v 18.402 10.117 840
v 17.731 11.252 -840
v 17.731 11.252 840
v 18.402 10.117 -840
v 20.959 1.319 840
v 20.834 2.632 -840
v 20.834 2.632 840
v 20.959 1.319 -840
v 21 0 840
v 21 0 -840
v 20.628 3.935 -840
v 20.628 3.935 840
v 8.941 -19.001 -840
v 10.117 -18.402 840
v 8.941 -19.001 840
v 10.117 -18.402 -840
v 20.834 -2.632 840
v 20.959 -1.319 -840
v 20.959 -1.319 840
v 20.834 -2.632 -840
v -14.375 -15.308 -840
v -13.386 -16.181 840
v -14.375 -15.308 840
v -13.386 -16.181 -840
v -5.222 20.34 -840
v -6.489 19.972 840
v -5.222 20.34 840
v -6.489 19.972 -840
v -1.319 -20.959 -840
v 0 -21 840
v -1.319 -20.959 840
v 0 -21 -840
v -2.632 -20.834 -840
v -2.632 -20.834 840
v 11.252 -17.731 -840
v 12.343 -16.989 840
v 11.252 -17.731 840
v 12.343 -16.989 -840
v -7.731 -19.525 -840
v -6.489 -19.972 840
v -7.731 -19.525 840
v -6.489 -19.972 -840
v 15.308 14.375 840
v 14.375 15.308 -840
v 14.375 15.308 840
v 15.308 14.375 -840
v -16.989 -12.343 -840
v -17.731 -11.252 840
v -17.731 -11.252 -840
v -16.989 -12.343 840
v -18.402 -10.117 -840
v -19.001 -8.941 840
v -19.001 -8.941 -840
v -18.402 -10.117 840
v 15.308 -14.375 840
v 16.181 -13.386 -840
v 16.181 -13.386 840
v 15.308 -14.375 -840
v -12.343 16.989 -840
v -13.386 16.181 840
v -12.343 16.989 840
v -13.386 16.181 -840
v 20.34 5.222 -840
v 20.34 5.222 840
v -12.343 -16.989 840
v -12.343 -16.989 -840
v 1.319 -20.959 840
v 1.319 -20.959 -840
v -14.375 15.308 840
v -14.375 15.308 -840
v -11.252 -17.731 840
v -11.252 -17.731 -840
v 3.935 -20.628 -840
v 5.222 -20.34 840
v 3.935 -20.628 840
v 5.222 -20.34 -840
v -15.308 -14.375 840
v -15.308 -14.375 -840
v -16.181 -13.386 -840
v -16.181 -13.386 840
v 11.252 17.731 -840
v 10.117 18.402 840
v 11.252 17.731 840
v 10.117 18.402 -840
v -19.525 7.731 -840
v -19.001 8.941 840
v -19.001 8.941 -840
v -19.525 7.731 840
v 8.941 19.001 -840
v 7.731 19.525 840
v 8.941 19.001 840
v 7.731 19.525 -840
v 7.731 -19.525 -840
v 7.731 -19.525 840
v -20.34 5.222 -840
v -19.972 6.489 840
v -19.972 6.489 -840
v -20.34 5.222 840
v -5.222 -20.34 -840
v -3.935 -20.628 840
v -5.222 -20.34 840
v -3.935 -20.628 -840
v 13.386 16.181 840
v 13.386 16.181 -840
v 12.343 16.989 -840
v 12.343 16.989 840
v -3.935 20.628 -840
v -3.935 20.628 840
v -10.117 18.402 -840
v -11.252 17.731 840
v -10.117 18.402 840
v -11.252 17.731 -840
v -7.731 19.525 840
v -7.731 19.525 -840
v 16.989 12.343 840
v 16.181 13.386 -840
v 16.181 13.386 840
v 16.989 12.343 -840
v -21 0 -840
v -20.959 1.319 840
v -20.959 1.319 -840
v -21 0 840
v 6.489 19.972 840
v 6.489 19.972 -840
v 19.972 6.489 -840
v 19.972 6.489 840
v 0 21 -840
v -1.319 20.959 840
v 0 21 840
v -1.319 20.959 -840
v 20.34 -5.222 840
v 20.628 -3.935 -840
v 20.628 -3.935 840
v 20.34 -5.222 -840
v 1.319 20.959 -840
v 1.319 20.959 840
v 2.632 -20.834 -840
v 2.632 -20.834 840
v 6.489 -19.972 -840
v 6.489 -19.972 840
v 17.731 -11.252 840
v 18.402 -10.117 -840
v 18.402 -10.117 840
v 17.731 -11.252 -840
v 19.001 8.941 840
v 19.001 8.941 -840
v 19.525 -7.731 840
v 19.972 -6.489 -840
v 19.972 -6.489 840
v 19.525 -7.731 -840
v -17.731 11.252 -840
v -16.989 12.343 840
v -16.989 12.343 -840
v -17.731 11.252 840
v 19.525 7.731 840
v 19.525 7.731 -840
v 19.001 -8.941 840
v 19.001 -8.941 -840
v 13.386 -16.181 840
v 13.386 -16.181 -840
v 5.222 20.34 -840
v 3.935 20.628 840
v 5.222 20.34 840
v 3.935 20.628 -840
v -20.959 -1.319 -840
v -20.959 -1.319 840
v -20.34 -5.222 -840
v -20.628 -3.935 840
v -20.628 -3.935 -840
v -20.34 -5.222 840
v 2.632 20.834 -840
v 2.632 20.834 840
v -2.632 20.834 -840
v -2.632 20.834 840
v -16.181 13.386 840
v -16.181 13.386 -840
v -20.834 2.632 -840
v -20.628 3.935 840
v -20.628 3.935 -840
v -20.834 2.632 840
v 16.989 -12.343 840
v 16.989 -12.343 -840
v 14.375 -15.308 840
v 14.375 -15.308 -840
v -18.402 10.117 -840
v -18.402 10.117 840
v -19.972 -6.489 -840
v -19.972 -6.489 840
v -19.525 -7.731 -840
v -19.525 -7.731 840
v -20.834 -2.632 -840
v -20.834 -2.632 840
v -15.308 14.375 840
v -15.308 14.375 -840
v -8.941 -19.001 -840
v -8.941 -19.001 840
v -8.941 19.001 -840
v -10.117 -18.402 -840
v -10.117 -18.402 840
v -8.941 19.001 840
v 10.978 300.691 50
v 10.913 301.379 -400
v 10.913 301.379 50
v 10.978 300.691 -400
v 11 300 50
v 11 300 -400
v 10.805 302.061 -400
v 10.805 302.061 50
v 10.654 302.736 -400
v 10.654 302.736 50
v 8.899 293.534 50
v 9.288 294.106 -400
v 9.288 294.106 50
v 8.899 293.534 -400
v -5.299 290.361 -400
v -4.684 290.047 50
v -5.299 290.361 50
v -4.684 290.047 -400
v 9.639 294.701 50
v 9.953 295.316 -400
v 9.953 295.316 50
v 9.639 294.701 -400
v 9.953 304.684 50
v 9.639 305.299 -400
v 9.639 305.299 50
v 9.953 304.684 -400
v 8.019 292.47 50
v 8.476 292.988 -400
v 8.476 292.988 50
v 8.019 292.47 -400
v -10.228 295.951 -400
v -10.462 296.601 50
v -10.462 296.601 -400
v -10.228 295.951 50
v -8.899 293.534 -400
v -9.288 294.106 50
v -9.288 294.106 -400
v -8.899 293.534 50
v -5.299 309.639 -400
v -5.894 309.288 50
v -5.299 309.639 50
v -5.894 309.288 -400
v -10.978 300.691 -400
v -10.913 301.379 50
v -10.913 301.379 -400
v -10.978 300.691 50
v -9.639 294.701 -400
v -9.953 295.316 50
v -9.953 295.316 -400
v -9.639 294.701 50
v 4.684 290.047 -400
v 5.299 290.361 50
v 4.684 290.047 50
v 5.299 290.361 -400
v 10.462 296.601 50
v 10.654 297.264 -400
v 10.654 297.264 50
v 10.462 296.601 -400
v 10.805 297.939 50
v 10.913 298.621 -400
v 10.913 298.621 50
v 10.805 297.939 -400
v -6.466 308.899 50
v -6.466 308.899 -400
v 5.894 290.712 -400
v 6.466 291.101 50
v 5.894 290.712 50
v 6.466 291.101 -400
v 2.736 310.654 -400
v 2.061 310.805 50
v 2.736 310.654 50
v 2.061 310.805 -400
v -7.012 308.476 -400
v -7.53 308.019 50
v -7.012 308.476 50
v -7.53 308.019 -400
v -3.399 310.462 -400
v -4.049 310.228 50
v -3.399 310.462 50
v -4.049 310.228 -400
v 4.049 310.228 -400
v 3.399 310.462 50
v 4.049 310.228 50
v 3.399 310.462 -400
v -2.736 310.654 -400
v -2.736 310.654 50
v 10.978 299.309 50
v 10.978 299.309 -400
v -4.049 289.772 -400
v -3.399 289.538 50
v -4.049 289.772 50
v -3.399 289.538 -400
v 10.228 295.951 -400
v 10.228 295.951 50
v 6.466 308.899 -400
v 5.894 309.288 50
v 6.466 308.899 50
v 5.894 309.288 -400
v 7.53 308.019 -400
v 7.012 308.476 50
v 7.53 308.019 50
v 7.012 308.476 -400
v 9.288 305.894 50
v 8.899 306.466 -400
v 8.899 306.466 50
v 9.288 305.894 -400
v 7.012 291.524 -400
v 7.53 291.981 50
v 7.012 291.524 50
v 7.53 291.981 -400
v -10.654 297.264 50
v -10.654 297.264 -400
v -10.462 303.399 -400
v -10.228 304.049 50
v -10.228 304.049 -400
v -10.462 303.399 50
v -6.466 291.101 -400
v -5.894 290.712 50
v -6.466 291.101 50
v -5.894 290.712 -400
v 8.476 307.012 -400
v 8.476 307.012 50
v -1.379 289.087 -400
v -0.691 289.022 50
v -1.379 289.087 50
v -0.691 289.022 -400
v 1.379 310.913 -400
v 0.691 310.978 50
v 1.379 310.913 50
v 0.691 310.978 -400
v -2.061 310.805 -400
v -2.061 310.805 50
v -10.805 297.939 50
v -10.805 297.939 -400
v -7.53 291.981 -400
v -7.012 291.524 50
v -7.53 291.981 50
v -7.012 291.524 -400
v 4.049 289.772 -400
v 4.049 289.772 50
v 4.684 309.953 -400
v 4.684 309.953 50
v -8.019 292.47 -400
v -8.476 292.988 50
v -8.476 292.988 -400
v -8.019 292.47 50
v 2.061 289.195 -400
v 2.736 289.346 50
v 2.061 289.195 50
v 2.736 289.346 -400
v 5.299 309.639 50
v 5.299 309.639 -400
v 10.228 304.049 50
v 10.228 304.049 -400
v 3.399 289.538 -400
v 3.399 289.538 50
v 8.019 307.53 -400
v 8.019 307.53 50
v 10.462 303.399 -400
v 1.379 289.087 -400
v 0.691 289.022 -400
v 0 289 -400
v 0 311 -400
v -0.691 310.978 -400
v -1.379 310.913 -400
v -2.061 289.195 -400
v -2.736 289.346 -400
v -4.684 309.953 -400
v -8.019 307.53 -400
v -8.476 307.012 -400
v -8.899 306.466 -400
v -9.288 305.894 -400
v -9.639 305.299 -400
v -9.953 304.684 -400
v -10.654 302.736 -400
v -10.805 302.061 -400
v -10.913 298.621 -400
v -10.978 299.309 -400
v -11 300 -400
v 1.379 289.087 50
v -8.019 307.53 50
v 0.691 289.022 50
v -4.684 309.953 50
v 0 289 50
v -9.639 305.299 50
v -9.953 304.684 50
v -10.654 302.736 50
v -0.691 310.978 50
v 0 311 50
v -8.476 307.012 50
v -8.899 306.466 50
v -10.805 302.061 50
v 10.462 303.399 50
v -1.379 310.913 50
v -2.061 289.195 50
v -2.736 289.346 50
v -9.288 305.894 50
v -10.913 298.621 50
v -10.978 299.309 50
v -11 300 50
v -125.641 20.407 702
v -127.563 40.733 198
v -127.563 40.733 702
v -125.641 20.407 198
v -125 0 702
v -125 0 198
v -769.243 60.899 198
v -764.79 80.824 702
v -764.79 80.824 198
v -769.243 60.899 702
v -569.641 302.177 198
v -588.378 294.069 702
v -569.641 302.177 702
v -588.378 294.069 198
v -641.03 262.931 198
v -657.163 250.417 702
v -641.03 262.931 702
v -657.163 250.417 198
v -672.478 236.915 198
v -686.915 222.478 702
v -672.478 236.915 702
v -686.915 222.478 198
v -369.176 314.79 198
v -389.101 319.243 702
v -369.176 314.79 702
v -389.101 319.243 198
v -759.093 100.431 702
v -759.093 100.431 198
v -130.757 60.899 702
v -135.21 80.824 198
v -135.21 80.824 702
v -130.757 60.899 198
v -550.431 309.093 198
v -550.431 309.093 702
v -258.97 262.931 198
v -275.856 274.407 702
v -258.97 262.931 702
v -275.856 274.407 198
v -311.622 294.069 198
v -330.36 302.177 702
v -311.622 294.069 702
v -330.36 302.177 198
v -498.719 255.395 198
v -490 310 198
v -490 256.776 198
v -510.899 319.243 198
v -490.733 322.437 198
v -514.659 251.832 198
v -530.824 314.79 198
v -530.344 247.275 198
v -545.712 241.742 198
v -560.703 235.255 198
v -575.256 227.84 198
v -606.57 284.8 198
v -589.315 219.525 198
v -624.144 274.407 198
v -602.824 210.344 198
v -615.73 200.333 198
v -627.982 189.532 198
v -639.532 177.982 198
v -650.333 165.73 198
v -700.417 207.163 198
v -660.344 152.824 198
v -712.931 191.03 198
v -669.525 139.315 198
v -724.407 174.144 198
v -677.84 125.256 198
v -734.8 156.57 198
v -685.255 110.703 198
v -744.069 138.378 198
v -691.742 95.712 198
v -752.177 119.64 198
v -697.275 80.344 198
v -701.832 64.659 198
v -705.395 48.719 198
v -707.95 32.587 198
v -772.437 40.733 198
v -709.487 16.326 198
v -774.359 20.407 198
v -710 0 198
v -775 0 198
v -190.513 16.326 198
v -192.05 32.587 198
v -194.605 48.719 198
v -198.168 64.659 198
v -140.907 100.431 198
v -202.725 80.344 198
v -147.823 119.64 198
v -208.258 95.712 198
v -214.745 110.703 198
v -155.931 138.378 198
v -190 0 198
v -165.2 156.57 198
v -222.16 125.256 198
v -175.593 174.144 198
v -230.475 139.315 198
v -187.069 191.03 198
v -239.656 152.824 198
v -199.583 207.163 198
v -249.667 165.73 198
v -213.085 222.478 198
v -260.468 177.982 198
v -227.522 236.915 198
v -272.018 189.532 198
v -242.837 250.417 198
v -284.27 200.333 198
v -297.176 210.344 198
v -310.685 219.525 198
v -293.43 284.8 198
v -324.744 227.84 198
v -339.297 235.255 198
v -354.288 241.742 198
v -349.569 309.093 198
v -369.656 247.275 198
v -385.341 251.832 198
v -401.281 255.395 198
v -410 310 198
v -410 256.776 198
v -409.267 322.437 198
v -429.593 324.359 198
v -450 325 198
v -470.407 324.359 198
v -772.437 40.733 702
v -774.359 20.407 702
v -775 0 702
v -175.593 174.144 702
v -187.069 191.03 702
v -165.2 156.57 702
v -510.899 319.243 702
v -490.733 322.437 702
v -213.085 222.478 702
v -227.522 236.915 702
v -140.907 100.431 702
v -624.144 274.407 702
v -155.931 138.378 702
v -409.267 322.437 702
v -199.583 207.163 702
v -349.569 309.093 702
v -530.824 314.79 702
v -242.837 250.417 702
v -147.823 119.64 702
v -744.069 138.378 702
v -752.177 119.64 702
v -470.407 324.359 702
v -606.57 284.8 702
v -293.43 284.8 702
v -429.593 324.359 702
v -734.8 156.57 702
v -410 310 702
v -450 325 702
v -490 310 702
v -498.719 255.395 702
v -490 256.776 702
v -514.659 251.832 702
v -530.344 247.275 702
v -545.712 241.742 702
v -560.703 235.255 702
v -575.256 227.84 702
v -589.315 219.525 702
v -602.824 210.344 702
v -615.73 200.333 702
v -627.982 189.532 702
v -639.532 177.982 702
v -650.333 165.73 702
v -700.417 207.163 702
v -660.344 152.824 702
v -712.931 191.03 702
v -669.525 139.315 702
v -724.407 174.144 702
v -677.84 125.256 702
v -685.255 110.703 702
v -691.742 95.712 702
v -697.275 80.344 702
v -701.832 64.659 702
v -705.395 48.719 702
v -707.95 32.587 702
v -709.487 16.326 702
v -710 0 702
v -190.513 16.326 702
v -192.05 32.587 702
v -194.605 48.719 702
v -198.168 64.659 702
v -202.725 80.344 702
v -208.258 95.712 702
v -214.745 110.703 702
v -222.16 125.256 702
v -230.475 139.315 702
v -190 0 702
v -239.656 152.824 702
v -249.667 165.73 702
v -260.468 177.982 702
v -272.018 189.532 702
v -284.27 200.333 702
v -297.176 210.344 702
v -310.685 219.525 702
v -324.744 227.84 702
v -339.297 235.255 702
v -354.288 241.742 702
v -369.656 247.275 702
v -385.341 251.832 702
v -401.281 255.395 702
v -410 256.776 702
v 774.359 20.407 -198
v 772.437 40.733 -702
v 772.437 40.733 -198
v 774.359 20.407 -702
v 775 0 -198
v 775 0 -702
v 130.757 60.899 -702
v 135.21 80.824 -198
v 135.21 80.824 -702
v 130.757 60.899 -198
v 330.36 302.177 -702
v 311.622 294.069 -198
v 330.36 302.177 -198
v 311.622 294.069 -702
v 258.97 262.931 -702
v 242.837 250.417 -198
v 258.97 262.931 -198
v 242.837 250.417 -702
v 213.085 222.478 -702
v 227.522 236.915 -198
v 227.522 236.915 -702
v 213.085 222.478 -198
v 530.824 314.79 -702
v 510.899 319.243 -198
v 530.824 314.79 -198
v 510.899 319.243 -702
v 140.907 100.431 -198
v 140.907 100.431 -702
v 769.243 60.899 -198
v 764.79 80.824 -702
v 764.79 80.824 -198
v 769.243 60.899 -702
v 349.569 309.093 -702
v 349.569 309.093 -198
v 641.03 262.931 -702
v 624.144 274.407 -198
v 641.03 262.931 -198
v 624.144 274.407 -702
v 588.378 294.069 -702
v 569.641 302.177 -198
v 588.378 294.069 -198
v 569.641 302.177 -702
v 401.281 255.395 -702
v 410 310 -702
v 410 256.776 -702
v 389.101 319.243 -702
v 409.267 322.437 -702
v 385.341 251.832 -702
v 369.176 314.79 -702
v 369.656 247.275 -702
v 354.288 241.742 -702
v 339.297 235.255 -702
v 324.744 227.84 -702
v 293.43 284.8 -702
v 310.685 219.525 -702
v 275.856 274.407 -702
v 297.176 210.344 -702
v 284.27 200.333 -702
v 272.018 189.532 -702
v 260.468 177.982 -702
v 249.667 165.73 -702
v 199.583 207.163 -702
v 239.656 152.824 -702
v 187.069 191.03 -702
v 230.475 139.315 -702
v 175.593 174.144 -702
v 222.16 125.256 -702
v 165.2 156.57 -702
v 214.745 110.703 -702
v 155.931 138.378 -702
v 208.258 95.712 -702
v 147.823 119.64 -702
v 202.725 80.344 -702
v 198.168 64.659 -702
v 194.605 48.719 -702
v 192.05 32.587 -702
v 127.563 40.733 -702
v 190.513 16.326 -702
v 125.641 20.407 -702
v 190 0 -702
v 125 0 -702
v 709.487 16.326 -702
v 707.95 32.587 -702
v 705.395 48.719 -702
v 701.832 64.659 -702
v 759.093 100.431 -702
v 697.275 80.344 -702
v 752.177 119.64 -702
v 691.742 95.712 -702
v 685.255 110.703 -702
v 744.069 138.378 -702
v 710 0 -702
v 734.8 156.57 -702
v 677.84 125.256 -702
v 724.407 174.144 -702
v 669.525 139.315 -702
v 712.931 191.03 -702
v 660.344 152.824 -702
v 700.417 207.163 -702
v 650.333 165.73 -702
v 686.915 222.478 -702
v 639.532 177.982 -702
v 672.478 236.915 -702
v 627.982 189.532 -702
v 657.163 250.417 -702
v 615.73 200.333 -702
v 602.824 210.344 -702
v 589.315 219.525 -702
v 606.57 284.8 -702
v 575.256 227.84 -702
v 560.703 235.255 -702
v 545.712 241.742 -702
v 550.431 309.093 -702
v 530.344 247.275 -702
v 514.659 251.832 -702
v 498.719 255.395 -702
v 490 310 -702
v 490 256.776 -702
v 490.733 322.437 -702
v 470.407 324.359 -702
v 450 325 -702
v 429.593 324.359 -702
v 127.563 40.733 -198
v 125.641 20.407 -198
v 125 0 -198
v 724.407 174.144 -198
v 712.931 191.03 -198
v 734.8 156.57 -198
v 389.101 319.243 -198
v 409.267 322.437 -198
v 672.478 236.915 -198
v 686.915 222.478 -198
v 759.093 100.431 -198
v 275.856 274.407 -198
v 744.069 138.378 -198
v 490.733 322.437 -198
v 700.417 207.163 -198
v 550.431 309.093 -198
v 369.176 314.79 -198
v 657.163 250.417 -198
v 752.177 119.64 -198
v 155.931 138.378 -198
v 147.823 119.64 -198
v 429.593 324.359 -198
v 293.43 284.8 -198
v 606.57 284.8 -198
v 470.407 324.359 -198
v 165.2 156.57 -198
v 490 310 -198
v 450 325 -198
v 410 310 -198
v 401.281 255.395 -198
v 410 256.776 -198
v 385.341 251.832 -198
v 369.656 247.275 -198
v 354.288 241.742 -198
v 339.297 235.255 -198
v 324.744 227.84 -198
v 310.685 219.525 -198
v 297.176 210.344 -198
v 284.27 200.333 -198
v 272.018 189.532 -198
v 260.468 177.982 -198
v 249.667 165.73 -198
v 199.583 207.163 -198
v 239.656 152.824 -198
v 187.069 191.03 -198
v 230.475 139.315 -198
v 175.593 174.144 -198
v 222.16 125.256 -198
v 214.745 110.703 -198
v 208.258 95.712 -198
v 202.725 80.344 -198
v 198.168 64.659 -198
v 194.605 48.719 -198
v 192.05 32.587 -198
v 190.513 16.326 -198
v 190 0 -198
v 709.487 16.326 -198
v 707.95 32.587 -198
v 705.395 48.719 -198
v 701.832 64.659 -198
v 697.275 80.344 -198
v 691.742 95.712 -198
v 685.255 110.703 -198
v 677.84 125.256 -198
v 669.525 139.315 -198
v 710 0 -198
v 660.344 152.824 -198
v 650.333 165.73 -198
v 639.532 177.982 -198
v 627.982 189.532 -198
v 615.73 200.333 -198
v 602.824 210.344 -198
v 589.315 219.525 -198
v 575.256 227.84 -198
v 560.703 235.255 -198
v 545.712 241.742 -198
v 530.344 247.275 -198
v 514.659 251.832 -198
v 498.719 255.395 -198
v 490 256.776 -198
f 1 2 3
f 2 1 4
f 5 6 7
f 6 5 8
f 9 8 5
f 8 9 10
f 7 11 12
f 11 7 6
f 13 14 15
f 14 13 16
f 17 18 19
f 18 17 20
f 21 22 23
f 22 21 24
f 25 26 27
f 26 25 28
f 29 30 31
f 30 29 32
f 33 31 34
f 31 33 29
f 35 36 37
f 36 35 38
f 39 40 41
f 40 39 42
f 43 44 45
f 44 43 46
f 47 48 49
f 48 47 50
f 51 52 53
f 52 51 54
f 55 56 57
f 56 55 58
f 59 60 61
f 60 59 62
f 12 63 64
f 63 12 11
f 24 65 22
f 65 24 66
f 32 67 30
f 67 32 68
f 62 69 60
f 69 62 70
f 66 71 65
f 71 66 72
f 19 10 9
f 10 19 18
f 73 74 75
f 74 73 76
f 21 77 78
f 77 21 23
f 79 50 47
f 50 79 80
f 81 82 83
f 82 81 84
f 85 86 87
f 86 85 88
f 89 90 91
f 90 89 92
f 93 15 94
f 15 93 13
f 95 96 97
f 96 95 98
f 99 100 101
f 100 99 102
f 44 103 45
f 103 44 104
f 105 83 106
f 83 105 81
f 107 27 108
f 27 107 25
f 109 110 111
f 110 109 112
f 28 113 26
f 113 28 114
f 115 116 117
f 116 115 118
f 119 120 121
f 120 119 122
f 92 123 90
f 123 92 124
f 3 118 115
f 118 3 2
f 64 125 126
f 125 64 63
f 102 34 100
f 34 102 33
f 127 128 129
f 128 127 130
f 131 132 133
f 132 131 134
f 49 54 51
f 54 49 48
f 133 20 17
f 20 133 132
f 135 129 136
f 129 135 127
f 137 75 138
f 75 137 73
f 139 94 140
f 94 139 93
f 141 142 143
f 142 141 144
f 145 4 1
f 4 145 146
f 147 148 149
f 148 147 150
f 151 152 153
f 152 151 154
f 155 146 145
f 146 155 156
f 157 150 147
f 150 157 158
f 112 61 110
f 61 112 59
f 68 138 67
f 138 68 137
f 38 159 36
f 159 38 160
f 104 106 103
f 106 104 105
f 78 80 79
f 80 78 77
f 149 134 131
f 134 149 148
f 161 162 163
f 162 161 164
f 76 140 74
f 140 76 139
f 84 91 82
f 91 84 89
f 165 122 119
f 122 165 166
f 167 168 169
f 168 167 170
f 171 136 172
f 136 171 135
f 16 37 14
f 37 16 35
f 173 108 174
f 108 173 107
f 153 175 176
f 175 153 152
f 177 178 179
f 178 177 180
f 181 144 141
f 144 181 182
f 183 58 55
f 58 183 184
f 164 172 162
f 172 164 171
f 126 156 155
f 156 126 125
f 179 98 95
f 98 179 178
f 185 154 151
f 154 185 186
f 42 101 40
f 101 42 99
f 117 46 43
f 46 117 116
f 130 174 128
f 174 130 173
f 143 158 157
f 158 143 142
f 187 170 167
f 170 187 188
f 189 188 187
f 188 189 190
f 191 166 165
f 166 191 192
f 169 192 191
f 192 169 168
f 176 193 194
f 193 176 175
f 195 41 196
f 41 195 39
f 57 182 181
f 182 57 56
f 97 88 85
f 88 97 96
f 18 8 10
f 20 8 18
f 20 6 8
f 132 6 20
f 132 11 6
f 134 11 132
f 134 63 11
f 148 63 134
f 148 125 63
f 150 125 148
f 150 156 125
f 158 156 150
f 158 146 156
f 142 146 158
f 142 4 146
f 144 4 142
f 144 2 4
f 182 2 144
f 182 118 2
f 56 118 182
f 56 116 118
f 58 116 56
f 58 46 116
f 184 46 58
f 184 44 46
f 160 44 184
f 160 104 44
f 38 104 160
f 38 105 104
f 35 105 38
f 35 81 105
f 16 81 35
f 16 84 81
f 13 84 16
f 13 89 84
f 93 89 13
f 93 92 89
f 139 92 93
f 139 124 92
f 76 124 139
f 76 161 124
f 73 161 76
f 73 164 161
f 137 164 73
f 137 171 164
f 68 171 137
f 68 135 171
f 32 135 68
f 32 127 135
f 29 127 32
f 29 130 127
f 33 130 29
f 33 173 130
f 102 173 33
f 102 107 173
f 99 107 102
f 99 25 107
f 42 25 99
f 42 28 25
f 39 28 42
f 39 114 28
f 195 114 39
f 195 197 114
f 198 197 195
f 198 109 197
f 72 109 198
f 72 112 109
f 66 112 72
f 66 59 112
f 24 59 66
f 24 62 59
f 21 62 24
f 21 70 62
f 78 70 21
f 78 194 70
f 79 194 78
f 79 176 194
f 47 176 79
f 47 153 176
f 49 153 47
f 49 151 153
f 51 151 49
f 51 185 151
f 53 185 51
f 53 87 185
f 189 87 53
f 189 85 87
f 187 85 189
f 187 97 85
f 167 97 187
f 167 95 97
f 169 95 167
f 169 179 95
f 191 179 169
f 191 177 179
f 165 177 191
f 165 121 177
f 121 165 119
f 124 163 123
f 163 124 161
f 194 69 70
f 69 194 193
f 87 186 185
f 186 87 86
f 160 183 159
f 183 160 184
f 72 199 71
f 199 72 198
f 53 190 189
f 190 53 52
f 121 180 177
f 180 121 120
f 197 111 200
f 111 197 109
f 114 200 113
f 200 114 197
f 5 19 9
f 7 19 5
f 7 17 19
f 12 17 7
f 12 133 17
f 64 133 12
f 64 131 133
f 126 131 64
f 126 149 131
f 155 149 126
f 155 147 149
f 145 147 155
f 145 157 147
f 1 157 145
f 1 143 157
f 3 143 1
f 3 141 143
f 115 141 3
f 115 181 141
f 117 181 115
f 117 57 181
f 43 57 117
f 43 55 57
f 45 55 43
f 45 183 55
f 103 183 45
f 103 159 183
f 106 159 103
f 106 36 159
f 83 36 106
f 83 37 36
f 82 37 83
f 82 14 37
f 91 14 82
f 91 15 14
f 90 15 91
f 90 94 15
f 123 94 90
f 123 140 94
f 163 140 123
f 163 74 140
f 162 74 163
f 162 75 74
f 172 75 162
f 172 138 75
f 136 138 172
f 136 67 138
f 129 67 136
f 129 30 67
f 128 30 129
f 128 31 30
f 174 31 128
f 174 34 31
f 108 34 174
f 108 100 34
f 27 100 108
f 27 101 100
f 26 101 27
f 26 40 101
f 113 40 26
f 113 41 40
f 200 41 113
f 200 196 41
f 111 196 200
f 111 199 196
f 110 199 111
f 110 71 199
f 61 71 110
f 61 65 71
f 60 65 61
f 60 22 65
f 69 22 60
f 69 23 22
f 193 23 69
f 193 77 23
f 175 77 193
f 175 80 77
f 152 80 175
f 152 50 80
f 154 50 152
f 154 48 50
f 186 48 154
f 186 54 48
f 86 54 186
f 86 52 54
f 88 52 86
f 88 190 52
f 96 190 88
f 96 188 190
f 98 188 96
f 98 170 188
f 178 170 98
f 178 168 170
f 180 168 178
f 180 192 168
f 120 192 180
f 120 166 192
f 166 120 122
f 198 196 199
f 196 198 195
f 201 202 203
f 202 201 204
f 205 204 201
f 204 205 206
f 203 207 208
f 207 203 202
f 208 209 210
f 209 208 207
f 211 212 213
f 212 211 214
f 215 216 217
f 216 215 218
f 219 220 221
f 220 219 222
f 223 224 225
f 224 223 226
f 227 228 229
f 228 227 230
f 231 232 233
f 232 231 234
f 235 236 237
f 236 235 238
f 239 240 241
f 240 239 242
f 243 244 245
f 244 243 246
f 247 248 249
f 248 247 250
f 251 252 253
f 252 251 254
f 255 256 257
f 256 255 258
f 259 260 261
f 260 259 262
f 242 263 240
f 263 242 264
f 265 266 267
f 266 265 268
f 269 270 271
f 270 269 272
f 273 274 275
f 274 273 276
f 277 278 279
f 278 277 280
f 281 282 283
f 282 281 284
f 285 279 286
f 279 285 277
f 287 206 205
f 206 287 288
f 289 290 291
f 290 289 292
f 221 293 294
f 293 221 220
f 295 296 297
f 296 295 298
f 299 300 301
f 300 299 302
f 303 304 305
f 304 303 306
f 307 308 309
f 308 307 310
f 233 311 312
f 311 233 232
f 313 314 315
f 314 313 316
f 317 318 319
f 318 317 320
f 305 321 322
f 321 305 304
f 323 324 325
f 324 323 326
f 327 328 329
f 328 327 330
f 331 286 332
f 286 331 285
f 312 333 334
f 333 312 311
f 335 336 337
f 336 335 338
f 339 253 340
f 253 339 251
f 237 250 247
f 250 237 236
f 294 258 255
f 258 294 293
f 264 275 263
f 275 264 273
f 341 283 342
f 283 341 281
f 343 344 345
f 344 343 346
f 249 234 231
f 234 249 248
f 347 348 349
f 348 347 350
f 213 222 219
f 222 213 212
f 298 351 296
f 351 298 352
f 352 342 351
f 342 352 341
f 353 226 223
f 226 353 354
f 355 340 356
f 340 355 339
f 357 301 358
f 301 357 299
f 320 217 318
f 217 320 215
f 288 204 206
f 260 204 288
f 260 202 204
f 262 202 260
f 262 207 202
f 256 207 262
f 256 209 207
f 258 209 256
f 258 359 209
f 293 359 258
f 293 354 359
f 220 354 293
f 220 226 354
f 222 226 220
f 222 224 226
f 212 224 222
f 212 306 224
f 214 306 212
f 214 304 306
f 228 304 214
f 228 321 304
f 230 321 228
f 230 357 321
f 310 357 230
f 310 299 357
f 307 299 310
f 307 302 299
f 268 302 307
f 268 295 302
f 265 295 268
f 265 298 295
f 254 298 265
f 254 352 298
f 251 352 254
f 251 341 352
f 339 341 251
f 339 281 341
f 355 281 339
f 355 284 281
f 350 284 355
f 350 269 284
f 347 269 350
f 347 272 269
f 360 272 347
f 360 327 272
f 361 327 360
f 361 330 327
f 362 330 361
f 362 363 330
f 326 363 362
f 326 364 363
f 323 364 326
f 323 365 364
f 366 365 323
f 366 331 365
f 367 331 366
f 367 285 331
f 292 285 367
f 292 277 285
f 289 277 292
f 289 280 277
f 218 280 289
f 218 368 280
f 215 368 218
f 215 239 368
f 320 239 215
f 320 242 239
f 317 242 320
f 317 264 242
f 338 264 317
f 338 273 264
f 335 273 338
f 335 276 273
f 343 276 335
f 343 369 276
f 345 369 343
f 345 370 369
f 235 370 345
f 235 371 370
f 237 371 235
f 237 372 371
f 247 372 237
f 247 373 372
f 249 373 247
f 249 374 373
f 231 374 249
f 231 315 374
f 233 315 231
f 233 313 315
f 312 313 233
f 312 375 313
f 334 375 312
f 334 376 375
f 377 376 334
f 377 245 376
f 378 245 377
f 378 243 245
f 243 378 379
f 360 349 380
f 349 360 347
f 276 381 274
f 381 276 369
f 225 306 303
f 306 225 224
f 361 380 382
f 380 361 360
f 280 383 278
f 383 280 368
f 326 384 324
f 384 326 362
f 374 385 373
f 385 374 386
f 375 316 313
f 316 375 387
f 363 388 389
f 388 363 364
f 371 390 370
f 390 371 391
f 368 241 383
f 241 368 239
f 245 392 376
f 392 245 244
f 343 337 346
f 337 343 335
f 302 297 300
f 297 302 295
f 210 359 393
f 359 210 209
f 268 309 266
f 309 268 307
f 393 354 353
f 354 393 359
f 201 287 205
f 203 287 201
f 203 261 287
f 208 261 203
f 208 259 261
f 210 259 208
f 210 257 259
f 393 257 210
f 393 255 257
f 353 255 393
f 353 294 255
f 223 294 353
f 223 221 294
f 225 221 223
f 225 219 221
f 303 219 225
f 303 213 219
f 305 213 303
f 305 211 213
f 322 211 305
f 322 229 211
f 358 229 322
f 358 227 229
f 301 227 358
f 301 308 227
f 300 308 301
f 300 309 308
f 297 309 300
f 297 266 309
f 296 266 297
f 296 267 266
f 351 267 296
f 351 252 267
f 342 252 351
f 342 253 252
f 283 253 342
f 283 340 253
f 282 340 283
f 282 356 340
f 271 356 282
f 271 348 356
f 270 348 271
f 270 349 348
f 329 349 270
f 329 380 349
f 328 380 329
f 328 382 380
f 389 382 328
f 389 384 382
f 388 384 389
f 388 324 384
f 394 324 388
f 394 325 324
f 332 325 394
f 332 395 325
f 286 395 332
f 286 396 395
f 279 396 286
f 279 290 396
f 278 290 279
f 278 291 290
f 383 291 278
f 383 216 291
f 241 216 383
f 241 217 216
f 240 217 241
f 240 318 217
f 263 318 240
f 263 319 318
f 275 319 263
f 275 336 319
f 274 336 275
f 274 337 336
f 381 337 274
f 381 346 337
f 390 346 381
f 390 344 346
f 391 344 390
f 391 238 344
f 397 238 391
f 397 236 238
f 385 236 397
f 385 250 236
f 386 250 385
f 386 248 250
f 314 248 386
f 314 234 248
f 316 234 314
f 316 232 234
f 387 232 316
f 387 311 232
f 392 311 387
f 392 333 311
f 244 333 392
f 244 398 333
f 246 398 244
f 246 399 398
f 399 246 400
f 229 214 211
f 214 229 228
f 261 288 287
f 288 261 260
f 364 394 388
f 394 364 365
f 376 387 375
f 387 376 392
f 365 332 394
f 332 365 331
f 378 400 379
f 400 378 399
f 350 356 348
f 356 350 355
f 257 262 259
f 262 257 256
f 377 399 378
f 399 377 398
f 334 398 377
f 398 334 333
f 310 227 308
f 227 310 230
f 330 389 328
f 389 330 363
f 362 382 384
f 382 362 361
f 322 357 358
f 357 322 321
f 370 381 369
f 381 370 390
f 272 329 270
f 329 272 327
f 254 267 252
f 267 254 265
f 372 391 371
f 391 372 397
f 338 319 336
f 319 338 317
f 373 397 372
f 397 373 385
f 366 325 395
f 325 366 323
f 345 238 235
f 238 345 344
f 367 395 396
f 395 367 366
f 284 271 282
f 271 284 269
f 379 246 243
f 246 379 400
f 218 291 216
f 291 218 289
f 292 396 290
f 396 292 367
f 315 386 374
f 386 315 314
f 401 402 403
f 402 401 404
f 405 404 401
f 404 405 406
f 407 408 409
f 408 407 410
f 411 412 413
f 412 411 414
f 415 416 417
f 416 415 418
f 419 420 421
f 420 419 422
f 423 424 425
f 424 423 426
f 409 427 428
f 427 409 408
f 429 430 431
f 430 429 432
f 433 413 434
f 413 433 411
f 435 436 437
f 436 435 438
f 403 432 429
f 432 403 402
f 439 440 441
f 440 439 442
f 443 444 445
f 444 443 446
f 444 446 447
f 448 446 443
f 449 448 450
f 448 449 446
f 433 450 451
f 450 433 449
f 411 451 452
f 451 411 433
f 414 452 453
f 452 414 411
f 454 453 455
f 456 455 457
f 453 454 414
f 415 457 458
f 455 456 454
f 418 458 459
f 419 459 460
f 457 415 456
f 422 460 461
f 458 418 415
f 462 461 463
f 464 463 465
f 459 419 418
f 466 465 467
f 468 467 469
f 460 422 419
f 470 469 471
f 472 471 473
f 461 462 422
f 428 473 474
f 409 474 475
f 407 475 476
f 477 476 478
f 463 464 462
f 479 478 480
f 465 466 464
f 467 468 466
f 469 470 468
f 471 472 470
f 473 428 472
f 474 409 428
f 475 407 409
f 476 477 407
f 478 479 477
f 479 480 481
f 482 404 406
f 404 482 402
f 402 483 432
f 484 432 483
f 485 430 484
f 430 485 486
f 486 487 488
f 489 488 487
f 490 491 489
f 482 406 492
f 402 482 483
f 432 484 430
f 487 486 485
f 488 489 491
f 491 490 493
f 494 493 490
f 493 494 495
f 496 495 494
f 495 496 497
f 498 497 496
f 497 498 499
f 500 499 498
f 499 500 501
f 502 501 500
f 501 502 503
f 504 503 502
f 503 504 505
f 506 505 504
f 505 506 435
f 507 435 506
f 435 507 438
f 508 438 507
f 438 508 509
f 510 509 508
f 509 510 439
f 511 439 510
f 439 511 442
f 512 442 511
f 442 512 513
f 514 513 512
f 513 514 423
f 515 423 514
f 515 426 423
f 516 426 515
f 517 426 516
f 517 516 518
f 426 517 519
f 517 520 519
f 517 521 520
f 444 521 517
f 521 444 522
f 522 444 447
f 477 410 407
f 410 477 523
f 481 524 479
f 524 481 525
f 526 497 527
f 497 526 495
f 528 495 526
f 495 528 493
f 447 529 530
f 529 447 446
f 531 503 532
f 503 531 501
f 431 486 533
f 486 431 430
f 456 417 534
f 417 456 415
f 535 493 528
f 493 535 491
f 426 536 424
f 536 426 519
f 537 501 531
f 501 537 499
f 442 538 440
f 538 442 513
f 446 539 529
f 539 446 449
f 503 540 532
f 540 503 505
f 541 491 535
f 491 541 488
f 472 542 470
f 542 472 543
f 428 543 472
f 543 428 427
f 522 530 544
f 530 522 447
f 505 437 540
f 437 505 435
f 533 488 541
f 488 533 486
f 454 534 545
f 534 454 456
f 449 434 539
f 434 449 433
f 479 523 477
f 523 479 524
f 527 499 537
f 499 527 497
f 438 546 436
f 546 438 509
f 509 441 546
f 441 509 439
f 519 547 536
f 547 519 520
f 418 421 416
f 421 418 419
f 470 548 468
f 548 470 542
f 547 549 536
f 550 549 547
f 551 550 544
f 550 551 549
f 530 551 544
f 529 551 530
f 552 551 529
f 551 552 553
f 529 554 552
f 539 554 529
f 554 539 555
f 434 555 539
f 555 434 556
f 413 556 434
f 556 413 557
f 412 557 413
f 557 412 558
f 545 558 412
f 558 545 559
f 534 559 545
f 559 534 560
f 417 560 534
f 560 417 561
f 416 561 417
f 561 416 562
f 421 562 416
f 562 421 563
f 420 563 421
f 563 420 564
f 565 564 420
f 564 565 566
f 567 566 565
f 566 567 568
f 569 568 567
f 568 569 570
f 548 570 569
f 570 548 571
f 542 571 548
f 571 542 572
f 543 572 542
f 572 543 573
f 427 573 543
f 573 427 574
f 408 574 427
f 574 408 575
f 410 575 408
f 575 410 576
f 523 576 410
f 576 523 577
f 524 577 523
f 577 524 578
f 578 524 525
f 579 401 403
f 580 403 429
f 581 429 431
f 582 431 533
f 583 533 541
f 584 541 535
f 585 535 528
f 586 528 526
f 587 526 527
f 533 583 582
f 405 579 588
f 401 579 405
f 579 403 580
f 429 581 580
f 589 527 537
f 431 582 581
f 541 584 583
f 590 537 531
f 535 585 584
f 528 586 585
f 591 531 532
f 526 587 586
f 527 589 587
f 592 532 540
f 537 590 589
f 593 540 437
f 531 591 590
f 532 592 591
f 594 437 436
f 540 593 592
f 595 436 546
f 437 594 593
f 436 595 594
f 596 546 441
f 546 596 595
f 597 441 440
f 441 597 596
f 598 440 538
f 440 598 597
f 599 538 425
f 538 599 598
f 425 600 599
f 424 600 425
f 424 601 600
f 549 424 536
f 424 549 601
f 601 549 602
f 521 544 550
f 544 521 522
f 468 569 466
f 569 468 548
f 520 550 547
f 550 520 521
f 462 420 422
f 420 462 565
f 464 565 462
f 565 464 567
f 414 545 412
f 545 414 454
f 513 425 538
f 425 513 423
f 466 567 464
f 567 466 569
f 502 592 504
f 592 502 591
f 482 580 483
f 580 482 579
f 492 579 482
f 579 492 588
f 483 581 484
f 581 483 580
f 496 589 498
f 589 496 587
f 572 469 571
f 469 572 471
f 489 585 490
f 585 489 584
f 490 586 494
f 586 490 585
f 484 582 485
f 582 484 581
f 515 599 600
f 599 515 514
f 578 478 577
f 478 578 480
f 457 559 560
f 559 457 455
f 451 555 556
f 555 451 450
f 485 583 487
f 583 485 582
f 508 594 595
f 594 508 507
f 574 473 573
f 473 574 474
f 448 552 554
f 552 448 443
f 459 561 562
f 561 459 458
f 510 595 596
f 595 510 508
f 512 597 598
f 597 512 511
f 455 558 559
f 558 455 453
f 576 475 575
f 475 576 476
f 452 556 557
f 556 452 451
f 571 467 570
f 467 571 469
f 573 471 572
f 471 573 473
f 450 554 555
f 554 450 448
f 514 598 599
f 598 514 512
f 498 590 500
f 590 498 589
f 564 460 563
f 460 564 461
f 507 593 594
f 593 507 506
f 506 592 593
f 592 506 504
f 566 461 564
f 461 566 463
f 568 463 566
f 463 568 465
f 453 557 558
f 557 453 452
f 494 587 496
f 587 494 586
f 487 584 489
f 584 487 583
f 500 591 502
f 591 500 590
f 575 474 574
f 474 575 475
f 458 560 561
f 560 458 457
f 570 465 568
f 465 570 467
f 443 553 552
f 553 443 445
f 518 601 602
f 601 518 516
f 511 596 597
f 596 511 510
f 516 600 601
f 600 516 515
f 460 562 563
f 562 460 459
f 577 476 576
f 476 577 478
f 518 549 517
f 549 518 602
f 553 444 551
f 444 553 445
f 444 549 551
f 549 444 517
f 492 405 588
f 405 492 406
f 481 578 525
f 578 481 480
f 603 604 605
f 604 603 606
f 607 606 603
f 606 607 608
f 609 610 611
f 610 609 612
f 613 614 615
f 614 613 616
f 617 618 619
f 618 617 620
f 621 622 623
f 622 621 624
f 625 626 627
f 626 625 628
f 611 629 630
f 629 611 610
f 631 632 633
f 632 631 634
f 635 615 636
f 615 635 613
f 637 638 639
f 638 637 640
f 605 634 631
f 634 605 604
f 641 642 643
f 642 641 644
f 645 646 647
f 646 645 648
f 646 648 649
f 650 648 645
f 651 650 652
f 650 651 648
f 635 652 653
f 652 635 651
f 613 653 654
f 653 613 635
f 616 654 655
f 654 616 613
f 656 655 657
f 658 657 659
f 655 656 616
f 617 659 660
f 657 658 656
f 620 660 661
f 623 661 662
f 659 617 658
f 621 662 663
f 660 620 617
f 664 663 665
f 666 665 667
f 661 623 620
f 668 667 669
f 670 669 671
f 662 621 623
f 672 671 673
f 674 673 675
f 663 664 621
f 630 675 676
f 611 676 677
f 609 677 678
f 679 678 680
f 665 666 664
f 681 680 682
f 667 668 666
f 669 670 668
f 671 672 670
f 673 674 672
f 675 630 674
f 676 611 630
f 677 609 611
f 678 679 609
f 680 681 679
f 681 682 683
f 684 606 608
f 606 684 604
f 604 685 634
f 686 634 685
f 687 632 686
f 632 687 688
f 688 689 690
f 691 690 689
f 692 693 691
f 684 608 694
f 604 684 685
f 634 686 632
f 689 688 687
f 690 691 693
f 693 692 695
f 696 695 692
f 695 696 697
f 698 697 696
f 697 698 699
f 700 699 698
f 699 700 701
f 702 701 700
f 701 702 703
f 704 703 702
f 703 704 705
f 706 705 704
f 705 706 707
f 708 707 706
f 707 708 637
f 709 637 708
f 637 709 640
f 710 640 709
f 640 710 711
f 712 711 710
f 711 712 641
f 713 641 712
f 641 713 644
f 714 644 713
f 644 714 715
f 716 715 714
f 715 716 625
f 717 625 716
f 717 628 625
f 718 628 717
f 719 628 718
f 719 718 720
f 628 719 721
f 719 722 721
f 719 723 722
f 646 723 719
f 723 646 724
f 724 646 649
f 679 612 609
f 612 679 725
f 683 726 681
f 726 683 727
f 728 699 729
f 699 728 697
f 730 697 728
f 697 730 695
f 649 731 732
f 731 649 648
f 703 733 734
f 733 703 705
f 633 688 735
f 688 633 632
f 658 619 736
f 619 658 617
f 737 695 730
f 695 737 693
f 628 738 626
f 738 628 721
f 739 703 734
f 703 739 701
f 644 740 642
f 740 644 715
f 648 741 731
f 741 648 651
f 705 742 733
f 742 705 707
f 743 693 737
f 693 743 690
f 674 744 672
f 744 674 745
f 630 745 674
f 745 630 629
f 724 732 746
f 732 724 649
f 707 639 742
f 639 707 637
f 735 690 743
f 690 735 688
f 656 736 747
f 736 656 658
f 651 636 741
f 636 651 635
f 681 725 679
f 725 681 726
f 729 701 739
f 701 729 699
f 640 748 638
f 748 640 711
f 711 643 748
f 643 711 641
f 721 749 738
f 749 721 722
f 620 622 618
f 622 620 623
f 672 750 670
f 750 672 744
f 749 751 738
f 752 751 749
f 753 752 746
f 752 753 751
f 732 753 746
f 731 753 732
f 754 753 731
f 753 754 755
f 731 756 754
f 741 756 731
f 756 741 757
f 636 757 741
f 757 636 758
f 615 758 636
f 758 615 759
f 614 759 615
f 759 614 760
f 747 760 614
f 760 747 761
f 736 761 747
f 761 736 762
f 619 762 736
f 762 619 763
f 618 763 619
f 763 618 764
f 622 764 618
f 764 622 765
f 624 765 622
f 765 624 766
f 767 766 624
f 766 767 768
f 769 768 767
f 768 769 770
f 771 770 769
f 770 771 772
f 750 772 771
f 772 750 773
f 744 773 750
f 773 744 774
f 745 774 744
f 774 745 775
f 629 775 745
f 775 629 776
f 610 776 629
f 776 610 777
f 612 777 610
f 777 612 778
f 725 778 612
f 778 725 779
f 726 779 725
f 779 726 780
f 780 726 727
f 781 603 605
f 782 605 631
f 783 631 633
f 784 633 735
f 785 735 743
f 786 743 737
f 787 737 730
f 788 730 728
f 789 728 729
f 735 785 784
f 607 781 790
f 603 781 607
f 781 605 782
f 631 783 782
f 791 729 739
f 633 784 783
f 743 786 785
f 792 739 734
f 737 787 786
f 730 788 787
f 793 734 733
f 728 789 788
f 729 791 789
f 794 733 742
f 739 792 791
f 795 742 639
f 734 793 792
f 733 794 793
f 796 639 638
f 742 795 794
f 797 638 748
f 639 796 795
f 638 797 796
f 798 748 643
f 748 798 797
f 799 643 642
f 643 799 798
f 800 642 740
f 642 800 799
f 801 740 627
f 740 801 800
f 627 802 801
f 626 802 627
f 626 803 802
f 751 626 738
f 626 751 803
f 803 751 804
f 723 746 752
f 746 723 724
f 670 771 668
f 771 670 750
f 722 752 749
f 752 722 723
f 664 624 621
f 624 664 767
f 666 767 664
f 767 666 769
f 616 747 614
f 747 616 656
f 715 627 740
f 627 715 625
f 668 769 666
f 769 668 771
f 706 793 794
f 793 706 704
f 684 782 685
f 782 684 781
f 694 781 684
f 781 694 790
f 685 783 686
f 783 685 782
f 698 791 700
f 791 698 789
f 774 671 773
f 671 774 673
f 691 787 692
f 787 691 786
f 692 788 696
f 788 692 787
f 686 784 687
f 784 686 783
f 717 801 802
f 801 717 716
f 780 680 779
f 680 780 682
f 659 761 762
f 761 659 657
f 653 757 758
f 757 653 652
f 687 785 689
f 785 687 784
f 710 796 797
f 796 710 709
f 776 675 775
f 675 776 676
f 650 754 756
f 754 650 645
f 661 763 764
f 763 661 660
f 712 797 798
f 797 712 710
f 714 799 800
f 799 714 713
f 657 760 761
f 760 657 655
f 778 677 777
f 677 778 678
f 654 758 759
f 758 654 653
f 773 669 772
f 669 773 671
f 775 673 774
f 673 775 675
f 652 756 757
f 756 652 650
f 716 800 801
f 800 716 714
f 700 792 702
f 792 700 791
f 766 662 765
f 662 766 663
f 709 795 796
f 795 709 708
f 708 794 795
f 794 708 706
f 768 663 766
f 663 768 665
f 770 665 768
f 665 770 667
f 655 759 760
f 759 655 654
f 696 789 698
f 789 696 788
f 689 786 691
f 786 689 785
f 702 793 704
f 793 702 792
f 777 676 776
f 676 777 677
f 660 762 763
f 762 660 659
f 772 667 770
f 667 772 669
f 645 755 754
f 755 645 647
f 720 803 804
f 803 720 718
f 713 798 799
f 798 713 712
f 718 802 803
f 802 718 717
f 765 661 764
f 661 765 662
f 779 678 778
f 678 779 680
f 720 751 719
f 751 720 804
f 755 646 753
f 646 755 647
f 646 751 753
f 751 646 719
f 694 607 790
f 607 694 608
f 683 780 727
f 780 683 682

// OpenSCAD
// ============================================================================
// PROJECT: XXXG-00W0 WING GUNDAM ZERO EW - FLIGHT SURFACE INFRA
// COMPONENT VAULT: BANDAI CAST RUNNER E - WING ANCHORS E1 & E2
// PACKAGING RE-ARCHITECTURE: SUB-ARMOR CAPACITOR RECESSED BANK INTEGRATION
// CONFIG METRIC: SCALED TITANIUM CASTS (1:1 ACTUAL METRIC UP-SCALE)
// ============================================================================

$fn = 100; // Circular segment rendering resolution count

// Structural Constants Scaled 1:1 for a 16.7-Meter Airframe Scale (mm)
anchor_total_length = 1120;              // Total longitudinal vertical height (mm)
pivot_bore_diameter = 520;               // Core cycloidal stabilizer pin width (mm)
armor_skin_thickness = 65;              // Solid TiAl protective plating wall (mm)
harness_conduit_width = 80;             // Cast-in 4oz copper logic trace track (mm)
capacitor_pocket_depth = 15;            // Sub-armor recessed housing pocket depth (mm)
capacitor_pocket_width = 140;           // Transverse MLCC array pocket width (mm)

module Runner_E_Wing_Anchor_Forge() {
    // Central Supply Injection Runner Axis (Molten Feed Line from Siphon Forge)
    color([0.22, 0.22, 0.25]) {
        cylinder(h = anchor_total_length * 1.5, d = 42, center = true);
        // Direct injection gates tracking straight into the part mold cavities
        translate() rotate() cylinder(h = 450, d = 22);
        translate([0, 300, -400]) rotate() cylinder(h = 450, d = 22);
    }
    
    // Instantiate Scaled Skeutomorphic Part Molds Symmetrically (Left & Right)
    Cast_Internal_Wing_Anchors();
}

module Cast_Internal_Wing_Anchors() {
    // ---- PART E1: INTERNAL LEFT STRUCTURAL UPPER WING BONE ANCHOR ---- [Page 19, Step 11-1]
    translate([-450, 0, 450]) color([0.35, 0.35, 0.38]) { // Inner Frame Dark Spec
        difference() {
            // Main solid heavy-duty core hinge block segment
            cylinder(h = anchor_total_length * 0.45, d = pivot_bore_diameter + (armor_skin_thickness * 2), center = true);
            
            // Central Cycloidal Pivot Track Bore (Houses pre-loaded alignment pins)
            cylinder(h = anchor_total_length * 0.5, d = pivot_bore_diameter, center = true);
            
            // SUB-ARMOR RECESSED CAPACITOR POCKETS [Segmented rows cut inside the armor inner wall]
            for (z_offset = [-150, 0, 150]) {
                translate([0, (pivot_bore_diameter/2 - armor_skin_thickness + capacitor_pocket_depth/2), z_offset])
                    cube([capacitor_pocket_width, capacitor_pocket_depth, 100], center = true);
            }
            
            // Continuous cast-in routing track for the 4oz solid-state wiring rails
            cube([harness_conduit_width, pivot_bore_diameter + 100, anchor_total_length], center = true);
            
            // Slicing profile tool to generate an asymmetrical half-shell part component
            translate([0, -pivot_bore_diameter, 0])
                cube([pivot_bore_diameter * 2, pivot_bore_diameter * 2, anchor_total_length * 2], center = true);
        }
    }
    
    // ---- PART E2: INTERNAL RIGHT STRUCTURAL UPPER WING BONE ANCHOR ---- [Page 19, Step 11-1]
    translate([450, 0, -450]) rotate() color([0.35, 0.35, 0.38]) {
        difference() {
            cylinder(h = anchor_total_length * 0.45, d = pivot_bore_diameter + (armor_skin_thickness * 2), center = true);
            cylinder(h = anchor_total_length * 0.5, d = pivot_bore_diameter, center = true);
            
            for (z_offset = [-150, 0, 150]) {
                translate([0, (pivot_bore_diameter/2 - armor_skin_thickness + capacitor_pocket_depth/2), z_offset])
                    cube([capacitor_pocket_width, capacitor_pocket_depth, 100], center = true);
            }
            
            cube([harness_conduit_width, pivot_bore_diameter + 100, anchor_total_length], center = true);
            translate([0, -pivot_bore_diameter, 0])
                cube([pivot_bore_diameter * 2, pivot_bore_diameter * 2, anchor_total_length * 2], center = true);
        }
    }
}

// Render Master Assembly to Parameter Workspace
Runner_E_Wing_Anchor_Forge();
